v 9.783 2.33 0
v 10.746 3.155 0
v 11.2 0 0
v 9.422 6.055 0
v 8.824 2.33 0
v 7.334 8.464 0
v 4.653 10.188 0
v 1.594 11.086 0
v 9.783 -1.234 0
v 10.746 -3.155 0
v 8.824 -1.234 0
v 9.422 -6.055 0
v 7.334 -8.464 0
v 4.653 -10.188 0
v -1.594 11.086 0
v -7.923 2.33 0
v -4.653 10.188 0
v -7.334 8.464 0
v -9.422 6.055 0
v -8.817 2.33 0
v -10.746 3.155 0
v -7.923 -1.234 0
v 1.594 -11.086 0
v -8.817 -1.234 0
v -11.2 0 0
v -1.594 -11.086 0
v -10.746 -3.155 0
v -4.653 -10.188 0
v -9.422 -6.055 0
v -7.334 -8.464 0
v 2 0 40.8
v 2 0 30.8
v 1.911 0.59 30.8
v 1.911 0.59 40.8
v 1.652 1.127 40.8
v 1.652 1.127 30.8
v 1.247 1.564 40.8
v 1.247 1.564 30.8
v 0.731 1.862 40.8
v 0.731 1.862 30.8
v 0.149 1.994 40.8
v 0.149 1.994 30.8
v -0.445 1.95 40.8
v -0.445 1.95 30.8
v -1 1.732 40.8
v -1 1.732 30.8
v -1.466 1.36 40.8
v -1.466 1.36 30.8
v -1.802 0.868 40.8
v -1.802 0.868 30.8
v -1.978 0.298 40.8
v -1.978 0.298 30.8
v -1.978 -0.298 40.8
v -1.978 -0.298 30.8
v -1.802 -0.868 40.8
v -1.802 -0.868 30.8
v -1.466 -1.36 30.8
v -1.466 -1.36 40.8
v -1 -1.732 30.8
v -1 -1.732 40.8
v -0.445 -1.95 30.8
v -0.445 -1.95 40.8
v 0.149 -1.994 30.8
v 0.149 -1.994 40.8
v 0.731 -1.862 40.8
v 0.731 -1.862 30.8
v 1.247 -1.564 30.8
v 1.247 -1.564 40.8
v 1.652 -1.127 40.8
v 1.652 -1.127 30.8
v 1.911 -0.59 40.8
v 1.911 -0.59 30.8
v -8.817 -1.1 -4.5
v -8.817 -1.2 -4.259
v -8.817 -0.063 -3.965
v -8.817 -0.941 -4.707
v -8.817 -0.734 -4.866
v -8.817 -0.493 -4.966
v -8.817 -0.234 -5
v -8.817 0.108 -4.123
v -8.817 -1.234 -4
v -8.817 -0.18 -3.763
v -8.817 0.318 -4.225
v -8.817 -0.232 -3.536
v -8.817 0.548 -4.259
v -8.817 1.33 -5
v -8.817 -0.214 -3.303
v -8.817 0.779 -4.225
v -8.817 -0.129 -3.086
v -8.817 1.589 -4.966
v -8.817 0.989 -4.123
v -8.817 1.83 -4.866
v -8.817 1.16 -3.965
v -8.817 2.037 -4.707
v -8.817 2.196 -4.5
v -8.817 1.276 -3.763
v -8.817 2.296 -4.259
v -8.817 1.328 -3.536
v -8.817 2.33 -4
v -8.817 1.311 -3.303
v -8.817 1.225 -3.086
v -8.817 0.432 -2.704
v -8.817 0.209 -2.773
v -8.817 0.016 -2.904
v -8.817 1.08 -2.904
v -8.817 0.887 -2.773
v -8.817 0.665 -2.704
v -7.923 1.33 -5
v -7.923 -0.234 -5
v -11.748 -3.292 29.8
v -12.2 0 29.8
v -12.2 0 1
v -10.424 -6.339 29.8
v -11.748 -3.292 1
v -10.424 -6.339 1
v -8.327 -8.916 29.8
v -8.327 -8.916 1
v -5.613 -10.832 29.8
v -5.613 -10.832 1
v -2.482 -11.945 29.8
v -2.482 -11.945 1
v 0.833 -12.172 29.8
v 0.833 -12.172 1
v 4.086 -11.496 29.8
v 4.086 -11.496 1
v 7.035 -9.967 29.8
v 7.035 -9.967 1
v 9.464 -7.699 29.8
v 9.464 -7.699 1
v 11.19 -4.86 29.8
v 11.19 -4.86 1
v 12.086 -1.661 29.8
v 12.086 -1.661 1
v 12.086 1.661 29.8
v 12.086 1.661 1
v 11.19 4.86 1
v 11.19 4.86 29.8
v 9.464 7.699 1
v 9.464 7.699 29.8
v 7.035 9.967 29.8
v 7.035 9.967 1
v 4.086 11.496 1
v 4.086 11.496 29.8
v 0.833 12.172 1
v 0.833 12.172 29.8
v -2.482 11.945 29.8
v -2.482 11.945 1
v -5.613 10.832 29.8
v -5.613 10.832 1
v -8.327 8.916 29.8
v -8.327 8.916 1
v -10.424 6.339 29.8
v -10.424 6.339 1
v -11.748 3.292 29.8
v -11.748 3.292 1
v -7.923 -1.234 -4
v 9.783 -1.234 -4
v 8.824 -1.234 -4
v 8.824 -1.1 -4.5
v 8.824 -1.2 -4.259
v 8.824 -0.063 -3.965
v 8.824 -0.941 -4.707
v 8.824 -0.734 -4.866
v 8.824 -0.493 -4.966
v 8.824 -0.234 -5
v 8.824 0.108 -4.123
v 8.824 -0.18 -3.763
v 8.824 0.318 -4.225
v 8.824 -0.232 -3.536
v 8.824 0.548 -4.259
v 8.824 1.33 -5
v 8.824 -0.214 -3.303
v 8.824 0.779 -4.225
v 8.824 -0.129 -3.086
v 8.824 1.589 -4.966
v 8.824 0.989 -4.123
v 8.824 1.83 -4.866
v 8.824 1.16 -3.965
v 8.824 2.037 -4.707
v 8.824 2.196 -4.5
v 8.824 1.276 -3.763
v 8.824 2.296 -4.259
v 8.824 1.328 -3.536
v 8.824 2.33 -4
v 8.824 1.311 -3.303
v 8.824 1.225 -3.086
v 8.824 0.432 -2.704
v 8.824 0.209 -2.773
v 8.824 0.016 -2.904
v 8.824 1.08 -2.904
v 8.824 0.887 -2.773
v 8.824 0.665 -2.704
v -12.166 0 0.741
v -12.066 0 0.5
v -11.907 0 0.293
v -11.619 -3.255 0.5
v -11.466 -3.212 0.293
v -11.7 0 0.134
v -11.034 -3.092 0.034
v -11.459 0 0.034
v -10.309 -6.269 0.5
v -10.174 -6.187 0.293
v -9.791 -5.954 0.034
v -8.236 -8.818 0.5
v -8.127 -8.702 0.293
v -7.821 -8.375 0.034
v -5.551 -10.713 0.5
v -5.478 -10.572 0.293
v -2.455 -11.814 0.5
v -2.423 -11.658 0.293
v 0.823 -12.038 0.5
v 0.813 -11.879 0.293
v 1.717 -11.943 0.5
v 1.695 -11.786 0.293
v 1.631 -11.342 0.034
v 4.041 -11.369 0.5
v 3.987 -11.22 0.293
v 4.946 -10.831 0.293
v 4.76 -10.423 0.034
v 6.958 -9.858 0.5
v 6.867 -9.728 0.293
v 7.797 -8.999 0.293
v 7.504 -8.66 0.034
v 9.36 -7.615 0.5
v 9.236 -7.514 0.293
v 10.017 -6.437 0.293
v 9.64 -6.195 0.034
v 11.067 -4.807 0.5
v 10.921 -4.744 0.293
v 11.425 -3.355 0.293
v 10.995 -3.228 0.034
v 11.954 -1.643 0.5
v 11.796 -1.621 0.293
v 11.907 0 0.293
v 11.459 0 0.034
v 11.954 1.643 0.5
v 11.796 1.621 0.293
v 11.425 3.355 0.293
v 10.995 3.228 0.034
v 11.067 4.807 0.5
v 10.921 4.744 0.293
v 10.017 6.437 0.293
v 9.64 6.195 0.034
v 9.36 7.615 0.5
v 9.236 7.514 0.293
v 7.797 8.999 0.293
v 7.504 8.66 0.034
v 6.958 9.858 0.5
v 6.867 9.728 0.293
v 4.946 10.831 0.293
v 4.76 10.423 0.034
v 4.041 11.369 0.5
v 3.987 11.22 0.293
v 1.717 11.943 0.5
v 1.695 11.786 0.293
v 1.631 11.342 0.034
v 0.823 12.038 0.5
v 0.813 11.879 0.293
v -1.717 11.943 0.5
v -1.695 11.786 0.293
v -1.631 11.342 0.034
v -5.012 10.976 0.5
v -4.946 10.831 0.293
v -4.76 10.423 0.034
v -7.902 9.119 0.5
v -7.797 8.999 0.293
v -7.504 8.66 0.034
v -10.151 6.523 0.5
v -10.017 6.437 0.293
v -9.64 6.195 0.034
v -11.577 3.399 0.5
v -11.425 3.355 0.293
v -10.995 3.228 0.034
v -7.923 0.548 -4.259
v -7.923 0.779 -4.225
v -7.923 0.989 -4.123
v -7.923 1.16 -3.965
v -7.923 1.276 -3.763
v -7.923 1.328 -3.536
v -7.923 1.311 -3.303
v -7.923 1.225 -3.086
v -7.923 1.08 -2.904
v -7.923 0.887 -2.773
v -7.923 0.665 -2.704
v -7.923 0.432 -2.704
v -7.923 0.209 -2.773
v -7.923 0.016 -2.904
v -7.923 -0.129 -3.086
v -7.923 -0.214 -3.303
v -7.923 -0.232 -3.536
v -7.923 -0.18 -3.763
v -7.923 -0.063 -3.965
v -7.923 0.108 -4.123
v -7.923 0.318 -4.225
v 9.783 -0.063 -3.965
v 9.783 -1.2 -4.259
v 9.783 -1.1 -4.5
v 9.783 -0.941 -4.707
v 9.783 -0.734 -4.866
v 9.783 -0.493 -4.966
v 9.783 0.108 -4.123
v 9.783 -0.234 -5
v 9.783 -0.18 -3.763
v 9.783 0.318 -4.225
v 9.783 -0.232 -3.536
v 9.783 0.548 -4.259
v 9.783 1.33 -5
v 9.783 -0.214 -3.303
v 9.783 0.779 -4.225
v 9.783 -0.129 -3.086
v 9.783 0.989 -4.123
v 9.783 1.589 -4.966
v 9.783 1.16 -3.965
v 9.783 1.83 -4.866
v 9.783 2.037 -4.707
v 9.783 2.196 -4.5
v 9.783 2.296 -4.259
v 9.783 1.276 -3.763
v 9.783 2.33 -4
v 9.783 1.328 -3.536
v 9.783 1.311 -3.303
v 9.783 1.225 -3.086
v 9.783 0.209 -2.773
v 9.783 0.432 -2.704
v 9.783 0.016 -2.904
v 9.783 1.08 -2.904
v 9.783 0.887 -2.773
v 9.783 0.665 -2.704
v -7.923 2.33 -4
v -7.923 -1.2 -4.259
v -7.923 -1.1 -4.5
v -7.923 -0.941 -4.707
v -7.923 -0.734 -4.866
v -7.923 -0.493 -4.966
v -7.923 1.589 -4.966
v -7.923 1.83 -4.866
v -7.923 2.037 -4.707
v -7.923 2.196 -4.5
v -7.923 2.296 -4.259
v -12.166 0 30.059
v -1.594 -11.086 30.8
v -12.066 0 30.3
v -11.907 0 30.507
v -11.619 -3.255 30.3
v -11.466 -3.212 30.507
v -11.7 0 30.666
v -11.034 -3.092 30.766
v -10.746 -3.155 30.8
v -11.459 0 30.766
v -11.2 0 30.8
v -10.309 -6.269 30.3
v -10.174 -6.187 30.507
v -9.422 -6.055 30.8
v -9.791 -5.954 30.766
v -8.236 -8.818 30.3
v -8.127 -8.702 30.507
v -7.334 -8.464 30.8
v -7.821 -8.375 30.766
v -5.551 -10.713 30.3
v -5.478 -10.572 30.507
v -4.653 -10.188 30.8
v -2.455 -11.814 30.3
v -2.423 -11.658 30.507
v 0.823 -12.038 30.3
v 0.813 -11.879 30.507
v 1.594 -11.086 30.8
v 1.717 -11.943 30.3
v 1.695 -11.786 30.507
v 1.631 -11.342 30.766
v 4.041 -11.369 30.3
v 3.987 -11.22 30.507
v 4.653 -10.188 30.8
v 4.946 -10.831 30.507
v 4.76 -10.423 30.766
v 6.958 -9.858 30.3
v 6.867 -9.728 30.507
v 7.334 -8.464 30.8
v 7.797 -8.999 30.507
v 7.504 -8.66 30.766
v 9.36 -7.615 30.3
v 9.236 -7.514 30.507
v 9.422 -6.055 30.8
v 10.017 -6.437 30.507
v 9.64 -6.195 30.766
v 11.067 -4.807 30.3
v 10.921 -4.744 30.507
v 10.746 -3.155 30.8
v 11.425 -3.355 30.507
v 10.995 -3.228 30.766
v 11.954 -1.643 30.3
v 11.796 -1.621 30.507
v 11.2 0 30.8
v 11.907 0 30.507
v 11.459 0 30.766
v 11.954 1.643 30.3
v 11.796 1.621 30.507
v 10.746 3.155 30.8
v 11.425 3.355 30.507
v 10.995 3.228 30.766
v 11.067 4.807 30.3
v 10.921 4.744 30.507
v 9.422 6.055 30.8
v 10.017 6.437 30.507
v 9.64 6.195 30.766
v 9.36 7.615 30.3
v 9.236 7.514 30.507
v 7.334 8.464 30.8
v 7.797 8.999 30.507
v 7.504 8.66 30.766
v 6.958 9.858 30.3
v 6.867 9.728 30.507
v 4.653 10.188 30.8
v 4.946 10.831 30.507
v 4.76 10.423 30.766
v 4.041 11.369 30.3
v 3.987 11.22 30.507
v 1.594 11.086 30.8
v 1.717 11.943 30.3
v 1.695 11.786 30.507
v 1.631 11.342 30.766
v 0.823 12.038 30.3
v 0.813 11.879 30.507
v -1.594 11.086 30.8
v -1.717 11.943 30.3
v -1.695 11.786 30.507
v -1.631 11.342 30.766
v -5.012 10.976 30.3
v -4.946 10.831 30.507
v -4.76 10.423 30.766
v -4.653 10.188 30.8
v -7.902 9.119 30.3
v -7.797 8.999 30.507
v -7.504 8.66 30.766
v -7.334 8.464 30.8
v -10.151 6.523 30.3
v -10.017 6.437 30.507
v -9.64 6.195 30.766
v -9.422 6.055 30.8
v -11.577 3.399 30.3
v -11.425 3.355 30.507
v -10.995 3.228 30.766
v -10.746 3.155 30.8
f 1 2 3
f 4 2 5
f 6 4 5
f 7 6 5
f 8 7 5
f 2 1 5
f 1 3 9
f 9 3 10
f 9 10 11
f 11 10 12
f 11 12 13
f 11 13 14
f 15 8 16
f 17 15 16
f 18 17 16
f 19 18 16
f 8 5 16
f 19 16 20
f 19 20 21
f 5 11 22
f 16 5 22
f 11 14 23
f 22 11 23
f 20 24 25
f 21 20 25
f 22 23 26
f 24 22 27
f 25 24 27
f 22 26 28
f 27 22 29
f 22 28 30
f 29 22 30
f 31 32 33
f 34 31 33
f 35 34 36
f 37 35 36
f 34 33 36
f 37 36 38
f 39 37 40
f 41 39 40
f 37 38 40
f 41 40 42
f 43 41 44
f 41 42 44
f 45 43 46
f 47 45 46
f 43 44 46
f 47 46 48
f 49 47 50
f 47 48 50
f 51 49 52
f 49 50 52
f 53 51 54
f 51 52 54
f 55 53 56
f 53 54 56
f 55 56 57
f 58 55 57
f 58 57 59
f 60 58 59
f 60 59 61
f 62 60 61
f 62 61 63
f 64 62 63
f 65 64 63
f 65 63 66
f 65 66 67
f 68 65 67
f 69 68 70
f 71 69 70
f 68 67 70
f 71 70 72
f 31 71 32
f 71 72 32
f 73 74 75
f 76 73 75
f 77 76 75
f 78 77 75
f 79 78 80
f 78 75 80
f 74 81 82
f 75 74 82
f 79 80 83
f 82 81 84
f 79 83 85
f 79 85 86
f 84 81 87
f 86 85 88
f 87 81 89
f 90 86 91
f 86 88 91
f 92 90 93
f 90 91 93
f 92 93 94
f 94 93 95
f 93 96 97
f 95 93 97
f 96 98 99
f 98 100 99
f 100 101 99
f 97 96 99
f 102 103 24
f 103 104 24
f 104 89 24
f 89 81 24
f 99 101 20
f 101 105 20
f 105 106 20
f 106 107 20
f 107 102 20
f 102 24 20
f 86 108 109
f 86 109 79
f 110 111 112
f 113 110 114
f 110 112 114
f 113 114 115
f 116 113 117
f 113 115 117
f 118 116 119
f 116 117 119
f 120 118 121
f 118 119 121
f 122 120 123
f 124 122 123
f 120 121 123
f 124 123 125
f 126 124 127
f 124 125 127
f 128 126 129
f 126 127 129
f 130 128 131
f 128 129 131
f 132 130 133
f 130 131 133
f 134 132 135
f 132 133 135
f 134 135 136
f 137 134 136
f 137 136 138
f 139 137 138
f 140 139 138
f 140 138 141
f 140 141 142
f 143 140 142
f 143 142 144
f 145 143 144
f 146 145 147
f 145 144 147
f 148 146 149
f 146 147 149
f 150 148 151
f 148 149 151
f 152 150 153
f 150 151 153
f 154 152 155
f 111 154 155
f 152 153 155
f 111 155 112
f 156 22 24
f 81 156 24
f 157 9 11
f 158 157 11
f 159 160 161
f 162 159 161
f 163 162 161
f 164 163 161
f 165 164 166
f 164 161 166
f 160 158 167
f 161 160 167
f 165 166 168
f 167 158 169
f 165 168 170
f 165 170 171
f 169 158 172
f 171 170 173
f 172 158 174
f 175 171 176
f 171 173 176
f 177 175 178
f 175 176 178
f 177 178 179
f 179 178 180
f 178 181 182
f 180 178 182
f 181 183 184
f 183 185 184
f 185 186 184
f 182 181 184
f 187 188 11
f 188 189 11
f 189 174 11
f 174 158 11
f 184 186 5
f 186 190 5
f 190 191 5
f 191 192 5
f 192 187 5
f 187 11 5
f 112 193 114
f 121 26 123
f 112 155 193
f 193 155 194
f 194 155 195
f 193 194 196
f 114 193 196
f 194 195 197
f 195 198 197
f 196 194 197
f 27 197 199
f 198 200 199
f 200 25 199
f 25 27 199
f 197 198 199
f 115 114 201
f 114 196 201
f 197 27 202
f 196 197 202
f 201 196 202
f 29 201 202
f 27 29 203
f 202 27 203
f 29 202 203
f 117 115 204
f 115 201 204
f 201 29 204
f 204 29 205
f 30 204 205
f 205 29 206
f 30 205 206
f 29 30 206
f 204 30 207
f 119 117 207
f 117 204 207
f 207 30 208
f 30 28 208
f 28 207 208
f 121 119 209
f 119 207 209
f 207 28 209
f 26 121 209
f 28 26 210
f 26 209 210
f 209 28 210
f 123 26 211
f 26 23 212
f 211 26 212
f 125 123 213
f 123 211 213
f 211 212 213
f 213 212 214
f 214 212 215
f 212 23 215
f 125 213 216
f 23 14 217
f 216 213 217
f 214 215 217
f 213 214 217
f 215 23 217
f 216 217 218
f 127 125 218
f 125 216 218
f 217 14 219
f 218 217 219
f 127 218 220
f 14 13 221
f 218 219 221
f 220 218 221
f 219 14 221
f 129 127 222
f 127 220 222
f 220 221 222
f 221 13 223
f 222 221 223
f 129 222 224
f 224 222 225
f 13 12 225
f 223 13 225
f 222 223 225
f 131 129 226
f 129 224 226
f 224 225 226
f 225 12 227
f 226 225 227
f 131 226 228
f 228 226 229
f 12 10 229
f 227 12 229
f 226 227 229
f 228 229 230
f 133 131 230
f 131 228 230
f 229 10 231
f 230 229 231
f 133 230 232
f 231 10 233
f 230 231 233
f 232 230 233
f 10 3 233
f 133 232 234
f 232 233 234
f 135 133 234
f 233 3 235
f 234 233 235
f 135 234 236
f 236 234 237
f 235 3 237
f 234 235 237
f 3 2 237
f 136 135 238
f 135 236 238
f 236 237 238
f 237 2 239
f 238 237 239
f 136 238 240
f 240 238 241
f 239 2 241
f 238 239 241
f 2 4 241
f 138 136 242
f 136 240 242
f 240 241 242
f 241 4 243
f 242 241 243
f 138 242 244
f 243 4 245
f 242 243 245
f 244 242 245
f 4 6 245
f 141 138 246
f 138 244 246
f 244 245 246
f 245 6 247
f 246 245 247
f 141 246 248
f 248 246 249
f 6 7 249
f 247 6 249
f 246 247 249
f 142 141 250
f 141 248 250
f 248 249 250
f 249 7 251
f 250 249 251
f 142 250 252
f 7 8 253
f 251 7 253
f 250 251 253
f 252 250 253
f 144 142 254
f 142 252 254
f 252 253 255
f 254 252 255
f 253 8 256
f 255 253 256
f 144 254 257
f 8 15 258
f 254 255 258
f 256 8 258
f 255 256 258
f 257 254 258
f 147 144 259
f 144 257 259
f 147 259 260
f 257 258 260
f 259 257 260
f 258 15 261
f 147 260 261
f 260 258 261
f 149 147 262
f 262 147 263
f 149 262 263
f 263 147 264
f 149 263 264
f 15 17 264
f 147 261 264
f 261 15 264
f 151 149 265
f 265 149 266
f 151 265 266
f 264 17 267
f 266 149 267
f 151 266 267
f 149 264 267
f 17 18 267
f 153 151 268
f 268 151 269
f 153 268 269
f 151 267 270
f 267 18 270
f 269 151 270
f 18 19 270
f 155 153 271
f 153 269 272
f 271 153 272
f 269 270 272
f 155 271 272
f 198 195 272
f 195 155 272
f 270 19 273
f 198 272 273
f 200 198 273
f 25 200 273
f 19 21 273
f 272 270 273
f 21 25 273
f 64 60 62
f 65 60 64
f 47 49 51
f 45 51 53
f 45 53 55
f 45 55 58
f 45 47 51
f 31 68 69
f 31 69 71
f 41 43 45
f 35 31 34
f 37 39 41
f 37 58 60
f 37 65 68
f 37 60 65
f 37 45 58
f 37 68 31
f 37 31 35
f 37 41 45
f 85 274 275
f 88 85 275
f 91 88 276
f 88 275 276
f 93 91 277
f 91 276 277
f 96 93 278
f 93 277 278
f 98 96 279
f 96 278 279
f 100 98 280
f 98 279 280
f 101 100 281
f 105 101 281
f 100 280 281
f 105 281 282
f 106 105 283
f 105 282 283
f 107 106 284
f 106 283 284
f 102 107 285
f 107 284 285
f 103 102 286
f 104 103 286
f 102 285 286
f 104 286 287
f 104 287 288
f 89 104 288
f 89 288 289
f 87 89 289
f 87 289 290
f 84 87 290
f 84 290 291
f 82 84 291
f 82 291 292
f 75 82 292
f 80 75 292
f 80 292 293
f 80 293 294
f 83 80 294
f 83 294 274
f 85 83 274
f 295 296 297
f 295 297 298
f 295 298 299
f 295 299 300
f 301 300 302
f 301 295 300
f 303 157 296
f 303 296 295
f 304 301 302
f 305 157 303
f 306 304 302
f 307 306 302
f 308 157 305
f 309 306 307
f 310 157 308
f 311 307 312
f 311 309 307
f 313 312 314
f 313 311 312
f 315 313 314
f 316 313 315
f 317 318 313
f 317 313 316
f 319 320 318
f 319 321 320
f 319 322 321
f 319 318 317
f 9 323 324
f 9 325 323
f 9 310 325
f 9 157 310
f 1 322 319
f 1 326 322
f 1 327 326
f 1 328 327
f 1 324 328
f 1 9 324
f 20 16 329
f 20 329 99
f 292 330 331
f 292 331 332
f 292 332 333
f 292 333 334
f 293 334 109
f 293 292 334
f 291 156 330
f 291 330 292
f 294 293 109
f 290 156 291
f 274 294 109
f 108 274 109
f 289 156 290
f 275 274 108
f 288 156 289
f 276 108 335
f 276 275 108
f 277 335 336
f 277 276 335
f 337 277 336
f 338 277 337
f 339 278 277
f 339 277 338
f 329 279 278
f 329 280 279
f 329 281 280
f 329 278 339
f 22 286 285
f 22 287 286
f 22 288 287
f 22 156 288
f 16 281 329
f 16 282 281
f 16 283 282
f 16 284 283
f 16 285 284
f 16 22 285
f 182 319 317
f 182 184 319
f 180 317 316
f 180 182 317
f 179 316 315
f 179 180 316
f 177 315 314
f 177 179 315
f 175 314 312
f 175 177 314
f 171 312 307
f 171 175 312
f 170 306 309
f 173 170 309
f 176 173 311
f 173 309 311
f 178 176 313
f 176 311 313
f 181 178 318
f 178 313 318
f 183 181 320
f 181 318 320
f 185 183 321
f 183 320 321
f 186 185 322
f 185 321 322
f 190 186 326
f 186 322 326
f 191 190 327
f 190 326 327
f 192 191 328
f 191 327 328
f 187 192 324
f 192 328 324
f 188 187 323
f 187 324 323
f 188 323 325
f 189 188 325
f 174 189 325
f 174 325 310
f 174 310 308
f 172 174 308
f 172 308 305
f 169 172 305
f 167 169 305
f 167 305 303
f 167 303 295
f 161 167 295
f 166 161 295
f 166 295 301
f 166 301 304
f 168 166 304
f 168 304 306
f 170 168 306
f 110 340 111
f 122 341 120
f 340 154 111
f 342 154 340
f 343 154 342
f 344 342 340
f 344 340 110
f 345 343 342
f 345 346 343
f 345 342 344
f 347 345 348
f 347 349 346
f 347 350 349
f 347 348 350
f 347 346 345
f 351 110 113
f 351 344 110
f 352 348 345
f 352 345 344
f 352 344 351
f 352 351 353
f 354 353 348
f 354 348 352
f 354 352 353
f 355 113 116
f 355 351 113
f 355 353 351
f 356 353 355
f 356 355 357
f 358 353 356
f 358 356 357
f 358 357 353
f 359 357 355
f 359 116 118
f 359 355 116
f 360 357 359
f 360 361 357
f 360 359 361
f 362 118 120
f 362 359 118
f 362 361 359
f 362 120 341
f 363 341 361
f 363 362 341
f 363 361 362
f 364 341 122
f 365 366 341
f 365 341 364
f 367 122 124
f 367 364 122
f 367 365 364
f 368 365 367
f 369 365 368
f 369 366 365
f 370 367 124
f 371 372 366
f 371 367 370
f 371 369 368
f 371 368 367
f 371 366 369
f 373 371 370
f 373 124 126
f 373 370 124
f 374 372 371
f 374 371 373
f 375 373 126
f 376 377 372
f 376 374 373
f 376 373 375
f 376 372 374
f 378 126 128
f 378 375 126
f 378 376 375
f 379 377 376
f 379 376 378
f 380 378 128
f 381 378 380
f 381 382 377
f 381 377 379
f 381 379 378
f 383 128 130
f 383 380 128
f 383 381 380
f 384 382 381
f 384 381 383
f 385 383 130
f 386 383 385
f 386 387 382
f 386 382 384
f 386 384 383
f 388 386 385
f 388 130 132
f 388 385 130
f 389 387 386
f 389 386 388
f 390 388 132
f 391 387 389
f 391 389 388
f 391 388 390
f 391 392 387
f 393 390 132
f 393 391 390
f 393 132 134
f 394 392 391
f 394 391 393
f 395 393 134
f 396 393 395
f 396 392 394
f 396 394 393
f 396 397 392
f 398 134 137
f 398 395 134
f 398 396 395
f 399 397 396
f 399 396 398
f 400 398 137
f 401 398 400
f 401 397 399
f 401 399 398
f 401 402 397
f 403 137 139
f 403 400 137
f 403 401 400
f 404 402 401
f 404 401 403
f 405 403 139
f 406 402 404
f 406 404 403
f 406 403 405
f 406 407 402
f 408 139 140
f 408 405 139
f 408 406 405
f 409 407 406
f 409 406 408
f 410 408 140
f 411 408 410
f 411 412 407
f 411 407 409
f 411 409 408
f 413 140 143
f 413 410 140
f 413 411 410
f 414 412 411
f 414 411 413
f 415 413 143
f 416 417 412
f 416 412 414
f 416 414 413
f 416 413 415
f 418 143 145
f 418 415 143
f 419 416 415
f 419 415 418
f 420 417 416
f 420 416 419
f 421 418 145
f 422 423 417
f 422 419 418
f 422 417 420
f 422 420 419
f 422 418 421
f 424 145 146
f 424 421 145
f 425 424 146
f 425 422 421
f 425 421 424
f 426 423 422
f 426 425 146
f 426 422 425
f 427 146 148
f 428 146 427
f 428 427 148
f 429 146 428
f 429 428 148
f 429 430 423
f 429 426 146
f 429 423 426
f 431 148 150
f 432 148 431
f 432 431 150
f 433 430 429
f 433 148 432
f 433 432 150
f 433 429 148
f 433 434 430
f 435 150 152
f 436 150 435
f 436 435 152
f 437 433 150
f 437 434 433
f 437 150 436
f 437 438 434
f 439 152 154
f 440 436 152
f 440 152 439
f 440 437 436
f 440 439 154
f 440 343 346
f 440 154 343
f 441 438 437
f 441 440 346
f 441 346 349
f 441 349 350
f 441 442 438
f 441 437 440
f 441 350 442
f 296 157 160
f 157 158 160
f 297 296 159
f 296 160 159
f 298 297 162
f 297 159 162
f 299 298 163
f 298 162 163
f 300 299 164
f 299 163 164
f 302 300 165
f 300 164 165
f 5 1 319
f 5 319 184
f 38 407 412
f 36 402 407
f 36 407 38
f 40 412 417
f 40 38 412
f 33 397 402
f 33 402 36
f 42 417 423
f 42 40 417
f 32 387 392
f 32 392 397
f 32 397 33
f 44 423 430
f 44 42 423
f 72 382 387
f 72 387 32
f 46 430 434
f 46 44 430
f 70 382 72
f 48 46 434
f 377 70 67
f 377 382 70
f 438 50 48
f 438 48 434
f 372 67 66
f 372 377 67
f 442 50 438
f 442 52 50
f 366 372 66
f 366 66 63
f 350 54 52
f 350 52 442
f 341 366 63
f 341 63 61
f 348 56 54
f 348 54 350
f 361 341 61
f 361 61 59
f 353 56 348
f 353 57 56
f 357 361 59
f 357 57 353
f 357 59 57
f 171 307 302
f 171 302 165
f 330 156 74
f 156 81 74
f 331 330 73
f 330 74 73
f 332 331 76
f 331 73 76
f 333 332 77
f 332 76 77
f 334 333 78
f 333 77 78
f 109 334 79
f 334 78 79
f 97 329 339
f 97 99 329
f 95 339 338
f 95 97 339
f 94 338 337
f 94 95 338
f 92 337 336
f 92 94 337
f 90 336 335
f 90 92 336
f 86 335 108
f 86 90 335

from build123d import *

# Parameters (mm, degrees)
ESBO_O1_R                = 12.2
RESSALTO_EXTRUS_O1_DEPTH = 30.8
FILETE1_R                = 1
ESBO_O2_R                = 2
RESSALTO_EXTRUS_O2_DEPTH = 10
ESBO_O4_W                = 0.958903526
ESBO_O4_H                = 3.564219336
ESBO_O4_W_2              = 0.894406544
RESSALTO_EXTRUS_O3_DEPTH = 5
FILETE2_R                = 1
ESBO_O5_R                = 0.782109668
CORTE_EXTRUS_O2_DEPTH    = 48.924150269


with BuildPart() as part:
    # Esboço1 → Ressalto-extrusão1 (new body)
    with BuildSketch(Plane.XY):
        with Locations(Location((0, 0, 0), (0, 0, 180))):
            Circle(ESBO_O1_R)
    extrude(amount=RESSALTO_EXTRUS_O1_DEPTH)

    # Filete1
    filete1_edges = [part.edges().sort_by_distance(p)[0] for p in [
        (12.2, 0, 0),
        (12.2, 0, 30.8),
    ]]
    fillet(filete1_edges, radius=FILETE1_R)

    # Esboço2 → Ressalto-extrusão2 (add)
    with BuildSketch(Plane.XY.offset(30.8)):
        Circle(ESBO_O2_R)
    extrude(amount=RESSALTO_EXTRUS_O2_DEPTH)

    # Esboço4 → Ressalto-extrusão3 (add)
    with BuildSketch(Plane(origin=(0, 0, 0), x_dir=(-1, 0, 0), z_dir=(0, 0, -1))):
        with Locations((-9.303363775, 0.548104497)):
            Rectangle(ESBO_O4_W, ESBO_O4_H)
        with Locations((8.369776419, 0.548104497)):
            Rectangle(ESBO_O4_W_2, ESBO_O4_H)
    extrude(amount=RESSALTO_EXTRUS_O3_DEPTH)

    # Filete2
    filete2_edges = [part.edges().sort_by_distance(p)[0] for p in [
        (9.303363775, -1.234005171, -5),
        (9.303363775, 2.330214165, -5),
        (-8.369776419, 2.330214165, -5),
        (-8.369776419, -1.234005171, -5),
    ]]
    fillet(filete2_edges, radius=FILETE2_R)

    # Esboço5 → Corte-extrusão2 (cut, through all)
    with BuildSketch(Plane(origin=(9.782815538, 0, 0), x_dir=(0, 0, -1), z_dir=(1, 0, 0))):
        with Locations((3.47716986, 0.548104497)):
            Circle(ESBO_O5_R)
    extrude(amount=-CORTE_EXTRUS_O2_DEPTH, mode=Mode.SUBTRACT)


solid = part.part
